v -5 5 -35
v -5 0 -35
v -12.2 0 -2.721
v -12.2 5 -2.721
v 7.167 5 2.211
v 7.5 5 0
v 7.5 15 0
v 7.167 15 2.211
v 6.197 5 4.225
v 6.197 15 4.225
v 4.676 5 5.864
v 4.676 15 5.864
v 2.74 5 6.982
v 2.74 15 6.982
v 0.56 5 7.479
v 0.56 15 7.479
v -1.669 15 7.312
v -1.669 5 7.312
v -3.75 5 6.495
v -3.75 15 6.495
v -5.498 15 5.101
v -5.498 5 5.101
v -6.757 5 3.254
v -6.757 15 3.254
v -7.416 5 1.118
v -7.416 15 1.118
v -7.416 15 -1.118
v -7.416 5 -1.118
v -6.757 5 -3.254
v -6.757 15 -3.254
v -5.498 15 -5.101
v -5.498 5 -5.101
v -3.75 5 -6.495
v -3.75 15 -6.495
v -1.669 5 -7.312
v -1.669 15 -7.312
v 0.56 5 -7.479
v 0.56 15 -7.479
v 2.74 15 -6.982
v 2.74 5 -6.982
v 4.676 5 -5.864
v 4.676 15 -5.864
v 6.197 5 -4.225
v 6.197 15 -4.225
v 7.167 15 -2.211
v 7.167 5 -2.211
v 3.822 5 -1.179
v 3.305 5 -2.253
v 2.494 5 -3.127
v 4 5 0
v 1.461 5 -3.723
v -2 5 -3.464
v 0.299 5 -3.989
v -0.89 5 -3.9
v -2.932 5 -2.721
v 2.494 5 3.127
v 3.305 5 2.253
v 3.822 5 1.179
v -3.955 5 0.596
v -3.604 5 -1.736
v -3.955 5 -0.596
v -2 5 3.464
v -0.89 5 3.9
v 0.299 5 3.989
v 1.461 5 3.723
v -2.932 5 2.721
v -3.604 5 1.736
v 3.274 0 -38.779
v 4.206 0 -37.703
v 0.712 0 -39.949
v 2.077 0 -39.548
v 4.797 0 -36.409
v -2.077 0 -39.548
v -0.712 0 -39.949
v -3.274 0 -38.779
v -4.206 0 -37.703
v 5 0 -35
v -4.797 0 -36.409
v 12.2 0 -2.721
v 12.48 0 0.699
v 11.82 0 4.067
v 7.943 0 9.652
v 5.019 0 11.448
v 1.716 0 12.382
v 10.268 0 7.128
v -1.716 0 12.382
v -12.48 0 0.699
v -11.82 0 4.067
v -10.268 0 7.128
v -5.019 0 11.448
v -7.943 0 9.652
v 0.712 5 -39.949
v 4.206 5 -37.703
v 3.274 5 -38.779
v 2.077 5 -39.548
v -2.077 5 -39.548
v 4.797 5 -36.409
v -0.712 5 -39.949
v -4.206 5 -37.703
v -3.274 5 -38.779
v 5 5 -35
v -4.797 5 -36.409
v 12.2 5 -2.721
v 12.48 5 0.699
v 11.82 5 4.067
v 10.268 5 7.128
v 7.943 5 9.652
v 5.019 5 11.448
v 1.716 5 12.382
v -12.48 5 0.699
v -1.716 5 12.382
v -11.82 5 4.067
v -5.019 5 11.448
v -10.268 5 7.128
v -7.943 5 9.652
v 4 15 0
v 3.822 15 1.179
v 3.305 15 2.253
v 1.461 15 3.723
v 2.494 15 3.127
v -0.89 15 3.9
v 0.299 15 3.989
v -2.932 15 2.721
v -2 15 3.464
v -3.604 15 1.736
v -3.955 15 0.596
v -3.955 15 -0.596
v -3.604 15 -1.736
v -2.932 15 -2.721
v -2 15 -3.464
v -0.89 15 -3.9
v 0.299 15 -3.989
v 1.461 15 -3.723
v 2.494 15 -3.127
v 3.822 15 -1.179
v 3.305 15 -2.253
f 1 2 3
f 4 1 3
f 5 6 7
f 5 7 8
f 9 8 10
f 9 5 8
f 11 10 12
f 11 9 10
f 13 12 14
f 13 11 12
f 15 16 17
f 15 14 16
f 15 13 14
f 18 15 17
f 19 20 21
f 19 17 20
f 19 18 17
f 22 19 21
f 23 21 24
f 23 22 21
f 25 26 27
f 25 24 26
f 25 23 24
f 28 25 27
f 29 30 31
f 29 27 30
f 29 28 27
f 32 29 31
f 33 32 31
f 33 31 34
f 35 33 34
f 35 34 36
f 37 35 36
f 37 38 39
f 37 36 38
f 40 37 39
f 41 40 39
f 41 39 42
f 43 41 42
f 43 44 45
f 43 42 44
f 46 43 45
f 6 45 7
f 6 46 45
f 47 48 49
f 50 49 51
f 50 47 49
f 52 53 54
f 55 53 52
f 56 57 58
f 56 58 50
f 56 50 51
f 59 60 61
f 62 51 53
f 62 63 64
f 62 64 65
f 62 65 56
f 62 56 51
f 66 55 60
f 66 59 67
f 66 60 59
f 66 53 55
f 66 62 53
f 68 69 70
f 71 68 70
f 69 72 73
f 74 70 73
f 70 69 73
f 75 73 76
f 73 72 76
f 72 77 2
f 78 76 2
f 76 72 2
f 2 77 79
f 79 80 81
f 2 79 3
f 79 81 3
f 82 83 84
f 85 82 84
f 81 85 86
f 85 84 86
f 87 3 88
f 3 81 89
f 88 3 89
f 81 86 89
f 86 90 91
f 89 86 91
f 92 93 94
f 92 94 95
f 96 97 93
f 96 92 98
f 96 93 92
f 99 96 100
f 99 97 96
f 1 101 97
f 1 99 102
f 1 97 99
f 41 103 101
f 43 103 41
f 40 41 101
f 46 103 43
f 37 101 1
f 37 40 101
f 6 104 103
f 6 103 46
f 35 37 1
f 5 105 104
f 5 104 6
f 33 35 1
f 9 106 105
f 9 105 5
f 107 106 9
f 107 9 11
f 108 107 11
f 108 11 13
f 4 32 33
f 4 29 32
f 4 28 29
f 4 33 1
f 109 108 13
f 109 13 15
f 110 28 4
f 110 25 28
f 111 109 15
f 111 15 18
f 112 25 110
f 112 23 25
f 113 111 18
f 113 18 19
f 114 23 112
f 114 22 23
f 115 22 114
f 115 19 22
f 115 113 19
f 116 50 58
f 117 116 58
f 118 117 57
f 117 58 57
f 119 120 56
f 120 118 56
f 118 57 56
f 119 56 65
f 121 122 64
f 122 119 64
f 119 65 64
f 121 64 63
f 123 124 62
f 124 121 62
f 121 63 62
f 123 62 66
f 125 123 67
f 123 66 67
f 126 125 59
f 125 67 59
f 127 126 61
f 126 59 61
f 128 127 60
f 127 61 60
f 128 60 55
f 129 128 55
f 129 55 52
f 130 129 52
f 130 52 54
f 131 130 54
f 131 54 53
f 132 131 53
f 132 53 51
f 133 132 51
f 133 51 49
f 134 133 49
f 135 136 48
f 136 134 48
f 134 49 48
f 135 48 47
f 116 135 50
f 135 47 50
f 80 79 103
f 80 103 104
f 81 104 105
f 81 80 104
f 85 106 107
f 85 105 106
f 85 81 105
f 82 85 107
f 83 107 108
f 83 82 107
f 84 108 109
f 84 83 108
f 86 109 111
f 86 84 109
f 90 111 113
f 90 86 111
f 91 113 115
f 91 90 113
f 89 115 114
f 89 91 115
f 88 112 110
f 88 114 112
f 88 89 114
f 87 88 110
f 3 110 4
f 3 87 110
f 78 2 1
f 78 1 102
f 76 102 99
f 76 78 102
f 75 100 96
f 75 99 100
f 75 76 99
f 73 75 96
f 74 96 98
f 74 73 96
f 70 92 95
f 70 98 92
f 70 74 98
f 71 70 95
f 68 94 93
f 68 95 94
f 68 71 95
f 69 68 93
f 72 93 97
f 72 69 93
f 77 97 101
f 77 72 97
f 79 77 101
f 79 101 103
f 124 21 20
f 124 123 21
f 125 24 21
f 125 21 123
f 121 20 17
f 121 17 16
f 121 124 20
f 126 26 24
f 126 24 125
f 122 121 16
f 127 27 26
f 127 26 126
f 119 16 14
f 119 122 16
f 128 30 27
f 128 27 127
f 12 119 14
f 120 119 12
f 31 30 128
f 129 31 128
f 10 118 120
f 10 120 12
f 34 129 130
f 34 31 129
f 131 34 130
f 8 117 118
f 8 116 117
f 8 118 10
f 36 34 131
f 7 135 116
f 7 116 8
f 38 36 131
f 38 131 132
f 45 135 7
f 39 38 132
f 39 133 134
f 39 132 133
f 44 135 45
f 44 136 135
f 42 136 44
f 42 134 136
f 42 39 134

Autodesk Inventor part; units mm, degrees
ref_plane "YZ Plane" through (0, 0, 0) normal (1, 0, 0) x (0, 1, 0)
ref_plane "XZ Plane" through (0, 0, 0) normal (0, 1, 0) x (-1, 0, 0)
ref_plane "XY Plane" through (0, 0, 0) normal (0, 0, 1) x (1, 0, 0)
sketch "Sketch1" plane through (0, 0, 0) normal (0, 1, 0) x (-1, 0, 0)
  point P0 (0, 0)
sketch "Sketch2" plane through (0, 0, 0) normal (0, 1, 0) x (-1, 0, 0)
  arc A0 (12.2002, -2.7214) -> (-12.2002, -2.7214) centre (0, 0) ccw
  arc A1 (-5, -35) -> (5, -35) centre (0, -35) ccw
  line L0 (5, -35) -> (12.2002, -2.7214)
  line L1 (-5, -35) -> (-12.2002, -2.7214)
  line L2 (0, 0) -> (0, -12.5)
  line L3 (0, -30) -> (0, -35)
  dimension "d0" = 25
  dimension "d1" = 35
  dimension "d2" = 10
extrude "Extrusion1" add sketch "Sketch2" along normal blind 5
sketch "Sketch3" plane through (0, 5, 0) normal (0, 1, 0) x (1, 0, 0)
  circle A0 centre (0, 0) radius 4
  circle A1 centre (0, 0) radius 7.5
  dimension "d5" = 8
  dimension "d6" = 15
extrude "Extrusion2" add sketch "Sketch3" along normal blind 10
properties part number "connector1"
